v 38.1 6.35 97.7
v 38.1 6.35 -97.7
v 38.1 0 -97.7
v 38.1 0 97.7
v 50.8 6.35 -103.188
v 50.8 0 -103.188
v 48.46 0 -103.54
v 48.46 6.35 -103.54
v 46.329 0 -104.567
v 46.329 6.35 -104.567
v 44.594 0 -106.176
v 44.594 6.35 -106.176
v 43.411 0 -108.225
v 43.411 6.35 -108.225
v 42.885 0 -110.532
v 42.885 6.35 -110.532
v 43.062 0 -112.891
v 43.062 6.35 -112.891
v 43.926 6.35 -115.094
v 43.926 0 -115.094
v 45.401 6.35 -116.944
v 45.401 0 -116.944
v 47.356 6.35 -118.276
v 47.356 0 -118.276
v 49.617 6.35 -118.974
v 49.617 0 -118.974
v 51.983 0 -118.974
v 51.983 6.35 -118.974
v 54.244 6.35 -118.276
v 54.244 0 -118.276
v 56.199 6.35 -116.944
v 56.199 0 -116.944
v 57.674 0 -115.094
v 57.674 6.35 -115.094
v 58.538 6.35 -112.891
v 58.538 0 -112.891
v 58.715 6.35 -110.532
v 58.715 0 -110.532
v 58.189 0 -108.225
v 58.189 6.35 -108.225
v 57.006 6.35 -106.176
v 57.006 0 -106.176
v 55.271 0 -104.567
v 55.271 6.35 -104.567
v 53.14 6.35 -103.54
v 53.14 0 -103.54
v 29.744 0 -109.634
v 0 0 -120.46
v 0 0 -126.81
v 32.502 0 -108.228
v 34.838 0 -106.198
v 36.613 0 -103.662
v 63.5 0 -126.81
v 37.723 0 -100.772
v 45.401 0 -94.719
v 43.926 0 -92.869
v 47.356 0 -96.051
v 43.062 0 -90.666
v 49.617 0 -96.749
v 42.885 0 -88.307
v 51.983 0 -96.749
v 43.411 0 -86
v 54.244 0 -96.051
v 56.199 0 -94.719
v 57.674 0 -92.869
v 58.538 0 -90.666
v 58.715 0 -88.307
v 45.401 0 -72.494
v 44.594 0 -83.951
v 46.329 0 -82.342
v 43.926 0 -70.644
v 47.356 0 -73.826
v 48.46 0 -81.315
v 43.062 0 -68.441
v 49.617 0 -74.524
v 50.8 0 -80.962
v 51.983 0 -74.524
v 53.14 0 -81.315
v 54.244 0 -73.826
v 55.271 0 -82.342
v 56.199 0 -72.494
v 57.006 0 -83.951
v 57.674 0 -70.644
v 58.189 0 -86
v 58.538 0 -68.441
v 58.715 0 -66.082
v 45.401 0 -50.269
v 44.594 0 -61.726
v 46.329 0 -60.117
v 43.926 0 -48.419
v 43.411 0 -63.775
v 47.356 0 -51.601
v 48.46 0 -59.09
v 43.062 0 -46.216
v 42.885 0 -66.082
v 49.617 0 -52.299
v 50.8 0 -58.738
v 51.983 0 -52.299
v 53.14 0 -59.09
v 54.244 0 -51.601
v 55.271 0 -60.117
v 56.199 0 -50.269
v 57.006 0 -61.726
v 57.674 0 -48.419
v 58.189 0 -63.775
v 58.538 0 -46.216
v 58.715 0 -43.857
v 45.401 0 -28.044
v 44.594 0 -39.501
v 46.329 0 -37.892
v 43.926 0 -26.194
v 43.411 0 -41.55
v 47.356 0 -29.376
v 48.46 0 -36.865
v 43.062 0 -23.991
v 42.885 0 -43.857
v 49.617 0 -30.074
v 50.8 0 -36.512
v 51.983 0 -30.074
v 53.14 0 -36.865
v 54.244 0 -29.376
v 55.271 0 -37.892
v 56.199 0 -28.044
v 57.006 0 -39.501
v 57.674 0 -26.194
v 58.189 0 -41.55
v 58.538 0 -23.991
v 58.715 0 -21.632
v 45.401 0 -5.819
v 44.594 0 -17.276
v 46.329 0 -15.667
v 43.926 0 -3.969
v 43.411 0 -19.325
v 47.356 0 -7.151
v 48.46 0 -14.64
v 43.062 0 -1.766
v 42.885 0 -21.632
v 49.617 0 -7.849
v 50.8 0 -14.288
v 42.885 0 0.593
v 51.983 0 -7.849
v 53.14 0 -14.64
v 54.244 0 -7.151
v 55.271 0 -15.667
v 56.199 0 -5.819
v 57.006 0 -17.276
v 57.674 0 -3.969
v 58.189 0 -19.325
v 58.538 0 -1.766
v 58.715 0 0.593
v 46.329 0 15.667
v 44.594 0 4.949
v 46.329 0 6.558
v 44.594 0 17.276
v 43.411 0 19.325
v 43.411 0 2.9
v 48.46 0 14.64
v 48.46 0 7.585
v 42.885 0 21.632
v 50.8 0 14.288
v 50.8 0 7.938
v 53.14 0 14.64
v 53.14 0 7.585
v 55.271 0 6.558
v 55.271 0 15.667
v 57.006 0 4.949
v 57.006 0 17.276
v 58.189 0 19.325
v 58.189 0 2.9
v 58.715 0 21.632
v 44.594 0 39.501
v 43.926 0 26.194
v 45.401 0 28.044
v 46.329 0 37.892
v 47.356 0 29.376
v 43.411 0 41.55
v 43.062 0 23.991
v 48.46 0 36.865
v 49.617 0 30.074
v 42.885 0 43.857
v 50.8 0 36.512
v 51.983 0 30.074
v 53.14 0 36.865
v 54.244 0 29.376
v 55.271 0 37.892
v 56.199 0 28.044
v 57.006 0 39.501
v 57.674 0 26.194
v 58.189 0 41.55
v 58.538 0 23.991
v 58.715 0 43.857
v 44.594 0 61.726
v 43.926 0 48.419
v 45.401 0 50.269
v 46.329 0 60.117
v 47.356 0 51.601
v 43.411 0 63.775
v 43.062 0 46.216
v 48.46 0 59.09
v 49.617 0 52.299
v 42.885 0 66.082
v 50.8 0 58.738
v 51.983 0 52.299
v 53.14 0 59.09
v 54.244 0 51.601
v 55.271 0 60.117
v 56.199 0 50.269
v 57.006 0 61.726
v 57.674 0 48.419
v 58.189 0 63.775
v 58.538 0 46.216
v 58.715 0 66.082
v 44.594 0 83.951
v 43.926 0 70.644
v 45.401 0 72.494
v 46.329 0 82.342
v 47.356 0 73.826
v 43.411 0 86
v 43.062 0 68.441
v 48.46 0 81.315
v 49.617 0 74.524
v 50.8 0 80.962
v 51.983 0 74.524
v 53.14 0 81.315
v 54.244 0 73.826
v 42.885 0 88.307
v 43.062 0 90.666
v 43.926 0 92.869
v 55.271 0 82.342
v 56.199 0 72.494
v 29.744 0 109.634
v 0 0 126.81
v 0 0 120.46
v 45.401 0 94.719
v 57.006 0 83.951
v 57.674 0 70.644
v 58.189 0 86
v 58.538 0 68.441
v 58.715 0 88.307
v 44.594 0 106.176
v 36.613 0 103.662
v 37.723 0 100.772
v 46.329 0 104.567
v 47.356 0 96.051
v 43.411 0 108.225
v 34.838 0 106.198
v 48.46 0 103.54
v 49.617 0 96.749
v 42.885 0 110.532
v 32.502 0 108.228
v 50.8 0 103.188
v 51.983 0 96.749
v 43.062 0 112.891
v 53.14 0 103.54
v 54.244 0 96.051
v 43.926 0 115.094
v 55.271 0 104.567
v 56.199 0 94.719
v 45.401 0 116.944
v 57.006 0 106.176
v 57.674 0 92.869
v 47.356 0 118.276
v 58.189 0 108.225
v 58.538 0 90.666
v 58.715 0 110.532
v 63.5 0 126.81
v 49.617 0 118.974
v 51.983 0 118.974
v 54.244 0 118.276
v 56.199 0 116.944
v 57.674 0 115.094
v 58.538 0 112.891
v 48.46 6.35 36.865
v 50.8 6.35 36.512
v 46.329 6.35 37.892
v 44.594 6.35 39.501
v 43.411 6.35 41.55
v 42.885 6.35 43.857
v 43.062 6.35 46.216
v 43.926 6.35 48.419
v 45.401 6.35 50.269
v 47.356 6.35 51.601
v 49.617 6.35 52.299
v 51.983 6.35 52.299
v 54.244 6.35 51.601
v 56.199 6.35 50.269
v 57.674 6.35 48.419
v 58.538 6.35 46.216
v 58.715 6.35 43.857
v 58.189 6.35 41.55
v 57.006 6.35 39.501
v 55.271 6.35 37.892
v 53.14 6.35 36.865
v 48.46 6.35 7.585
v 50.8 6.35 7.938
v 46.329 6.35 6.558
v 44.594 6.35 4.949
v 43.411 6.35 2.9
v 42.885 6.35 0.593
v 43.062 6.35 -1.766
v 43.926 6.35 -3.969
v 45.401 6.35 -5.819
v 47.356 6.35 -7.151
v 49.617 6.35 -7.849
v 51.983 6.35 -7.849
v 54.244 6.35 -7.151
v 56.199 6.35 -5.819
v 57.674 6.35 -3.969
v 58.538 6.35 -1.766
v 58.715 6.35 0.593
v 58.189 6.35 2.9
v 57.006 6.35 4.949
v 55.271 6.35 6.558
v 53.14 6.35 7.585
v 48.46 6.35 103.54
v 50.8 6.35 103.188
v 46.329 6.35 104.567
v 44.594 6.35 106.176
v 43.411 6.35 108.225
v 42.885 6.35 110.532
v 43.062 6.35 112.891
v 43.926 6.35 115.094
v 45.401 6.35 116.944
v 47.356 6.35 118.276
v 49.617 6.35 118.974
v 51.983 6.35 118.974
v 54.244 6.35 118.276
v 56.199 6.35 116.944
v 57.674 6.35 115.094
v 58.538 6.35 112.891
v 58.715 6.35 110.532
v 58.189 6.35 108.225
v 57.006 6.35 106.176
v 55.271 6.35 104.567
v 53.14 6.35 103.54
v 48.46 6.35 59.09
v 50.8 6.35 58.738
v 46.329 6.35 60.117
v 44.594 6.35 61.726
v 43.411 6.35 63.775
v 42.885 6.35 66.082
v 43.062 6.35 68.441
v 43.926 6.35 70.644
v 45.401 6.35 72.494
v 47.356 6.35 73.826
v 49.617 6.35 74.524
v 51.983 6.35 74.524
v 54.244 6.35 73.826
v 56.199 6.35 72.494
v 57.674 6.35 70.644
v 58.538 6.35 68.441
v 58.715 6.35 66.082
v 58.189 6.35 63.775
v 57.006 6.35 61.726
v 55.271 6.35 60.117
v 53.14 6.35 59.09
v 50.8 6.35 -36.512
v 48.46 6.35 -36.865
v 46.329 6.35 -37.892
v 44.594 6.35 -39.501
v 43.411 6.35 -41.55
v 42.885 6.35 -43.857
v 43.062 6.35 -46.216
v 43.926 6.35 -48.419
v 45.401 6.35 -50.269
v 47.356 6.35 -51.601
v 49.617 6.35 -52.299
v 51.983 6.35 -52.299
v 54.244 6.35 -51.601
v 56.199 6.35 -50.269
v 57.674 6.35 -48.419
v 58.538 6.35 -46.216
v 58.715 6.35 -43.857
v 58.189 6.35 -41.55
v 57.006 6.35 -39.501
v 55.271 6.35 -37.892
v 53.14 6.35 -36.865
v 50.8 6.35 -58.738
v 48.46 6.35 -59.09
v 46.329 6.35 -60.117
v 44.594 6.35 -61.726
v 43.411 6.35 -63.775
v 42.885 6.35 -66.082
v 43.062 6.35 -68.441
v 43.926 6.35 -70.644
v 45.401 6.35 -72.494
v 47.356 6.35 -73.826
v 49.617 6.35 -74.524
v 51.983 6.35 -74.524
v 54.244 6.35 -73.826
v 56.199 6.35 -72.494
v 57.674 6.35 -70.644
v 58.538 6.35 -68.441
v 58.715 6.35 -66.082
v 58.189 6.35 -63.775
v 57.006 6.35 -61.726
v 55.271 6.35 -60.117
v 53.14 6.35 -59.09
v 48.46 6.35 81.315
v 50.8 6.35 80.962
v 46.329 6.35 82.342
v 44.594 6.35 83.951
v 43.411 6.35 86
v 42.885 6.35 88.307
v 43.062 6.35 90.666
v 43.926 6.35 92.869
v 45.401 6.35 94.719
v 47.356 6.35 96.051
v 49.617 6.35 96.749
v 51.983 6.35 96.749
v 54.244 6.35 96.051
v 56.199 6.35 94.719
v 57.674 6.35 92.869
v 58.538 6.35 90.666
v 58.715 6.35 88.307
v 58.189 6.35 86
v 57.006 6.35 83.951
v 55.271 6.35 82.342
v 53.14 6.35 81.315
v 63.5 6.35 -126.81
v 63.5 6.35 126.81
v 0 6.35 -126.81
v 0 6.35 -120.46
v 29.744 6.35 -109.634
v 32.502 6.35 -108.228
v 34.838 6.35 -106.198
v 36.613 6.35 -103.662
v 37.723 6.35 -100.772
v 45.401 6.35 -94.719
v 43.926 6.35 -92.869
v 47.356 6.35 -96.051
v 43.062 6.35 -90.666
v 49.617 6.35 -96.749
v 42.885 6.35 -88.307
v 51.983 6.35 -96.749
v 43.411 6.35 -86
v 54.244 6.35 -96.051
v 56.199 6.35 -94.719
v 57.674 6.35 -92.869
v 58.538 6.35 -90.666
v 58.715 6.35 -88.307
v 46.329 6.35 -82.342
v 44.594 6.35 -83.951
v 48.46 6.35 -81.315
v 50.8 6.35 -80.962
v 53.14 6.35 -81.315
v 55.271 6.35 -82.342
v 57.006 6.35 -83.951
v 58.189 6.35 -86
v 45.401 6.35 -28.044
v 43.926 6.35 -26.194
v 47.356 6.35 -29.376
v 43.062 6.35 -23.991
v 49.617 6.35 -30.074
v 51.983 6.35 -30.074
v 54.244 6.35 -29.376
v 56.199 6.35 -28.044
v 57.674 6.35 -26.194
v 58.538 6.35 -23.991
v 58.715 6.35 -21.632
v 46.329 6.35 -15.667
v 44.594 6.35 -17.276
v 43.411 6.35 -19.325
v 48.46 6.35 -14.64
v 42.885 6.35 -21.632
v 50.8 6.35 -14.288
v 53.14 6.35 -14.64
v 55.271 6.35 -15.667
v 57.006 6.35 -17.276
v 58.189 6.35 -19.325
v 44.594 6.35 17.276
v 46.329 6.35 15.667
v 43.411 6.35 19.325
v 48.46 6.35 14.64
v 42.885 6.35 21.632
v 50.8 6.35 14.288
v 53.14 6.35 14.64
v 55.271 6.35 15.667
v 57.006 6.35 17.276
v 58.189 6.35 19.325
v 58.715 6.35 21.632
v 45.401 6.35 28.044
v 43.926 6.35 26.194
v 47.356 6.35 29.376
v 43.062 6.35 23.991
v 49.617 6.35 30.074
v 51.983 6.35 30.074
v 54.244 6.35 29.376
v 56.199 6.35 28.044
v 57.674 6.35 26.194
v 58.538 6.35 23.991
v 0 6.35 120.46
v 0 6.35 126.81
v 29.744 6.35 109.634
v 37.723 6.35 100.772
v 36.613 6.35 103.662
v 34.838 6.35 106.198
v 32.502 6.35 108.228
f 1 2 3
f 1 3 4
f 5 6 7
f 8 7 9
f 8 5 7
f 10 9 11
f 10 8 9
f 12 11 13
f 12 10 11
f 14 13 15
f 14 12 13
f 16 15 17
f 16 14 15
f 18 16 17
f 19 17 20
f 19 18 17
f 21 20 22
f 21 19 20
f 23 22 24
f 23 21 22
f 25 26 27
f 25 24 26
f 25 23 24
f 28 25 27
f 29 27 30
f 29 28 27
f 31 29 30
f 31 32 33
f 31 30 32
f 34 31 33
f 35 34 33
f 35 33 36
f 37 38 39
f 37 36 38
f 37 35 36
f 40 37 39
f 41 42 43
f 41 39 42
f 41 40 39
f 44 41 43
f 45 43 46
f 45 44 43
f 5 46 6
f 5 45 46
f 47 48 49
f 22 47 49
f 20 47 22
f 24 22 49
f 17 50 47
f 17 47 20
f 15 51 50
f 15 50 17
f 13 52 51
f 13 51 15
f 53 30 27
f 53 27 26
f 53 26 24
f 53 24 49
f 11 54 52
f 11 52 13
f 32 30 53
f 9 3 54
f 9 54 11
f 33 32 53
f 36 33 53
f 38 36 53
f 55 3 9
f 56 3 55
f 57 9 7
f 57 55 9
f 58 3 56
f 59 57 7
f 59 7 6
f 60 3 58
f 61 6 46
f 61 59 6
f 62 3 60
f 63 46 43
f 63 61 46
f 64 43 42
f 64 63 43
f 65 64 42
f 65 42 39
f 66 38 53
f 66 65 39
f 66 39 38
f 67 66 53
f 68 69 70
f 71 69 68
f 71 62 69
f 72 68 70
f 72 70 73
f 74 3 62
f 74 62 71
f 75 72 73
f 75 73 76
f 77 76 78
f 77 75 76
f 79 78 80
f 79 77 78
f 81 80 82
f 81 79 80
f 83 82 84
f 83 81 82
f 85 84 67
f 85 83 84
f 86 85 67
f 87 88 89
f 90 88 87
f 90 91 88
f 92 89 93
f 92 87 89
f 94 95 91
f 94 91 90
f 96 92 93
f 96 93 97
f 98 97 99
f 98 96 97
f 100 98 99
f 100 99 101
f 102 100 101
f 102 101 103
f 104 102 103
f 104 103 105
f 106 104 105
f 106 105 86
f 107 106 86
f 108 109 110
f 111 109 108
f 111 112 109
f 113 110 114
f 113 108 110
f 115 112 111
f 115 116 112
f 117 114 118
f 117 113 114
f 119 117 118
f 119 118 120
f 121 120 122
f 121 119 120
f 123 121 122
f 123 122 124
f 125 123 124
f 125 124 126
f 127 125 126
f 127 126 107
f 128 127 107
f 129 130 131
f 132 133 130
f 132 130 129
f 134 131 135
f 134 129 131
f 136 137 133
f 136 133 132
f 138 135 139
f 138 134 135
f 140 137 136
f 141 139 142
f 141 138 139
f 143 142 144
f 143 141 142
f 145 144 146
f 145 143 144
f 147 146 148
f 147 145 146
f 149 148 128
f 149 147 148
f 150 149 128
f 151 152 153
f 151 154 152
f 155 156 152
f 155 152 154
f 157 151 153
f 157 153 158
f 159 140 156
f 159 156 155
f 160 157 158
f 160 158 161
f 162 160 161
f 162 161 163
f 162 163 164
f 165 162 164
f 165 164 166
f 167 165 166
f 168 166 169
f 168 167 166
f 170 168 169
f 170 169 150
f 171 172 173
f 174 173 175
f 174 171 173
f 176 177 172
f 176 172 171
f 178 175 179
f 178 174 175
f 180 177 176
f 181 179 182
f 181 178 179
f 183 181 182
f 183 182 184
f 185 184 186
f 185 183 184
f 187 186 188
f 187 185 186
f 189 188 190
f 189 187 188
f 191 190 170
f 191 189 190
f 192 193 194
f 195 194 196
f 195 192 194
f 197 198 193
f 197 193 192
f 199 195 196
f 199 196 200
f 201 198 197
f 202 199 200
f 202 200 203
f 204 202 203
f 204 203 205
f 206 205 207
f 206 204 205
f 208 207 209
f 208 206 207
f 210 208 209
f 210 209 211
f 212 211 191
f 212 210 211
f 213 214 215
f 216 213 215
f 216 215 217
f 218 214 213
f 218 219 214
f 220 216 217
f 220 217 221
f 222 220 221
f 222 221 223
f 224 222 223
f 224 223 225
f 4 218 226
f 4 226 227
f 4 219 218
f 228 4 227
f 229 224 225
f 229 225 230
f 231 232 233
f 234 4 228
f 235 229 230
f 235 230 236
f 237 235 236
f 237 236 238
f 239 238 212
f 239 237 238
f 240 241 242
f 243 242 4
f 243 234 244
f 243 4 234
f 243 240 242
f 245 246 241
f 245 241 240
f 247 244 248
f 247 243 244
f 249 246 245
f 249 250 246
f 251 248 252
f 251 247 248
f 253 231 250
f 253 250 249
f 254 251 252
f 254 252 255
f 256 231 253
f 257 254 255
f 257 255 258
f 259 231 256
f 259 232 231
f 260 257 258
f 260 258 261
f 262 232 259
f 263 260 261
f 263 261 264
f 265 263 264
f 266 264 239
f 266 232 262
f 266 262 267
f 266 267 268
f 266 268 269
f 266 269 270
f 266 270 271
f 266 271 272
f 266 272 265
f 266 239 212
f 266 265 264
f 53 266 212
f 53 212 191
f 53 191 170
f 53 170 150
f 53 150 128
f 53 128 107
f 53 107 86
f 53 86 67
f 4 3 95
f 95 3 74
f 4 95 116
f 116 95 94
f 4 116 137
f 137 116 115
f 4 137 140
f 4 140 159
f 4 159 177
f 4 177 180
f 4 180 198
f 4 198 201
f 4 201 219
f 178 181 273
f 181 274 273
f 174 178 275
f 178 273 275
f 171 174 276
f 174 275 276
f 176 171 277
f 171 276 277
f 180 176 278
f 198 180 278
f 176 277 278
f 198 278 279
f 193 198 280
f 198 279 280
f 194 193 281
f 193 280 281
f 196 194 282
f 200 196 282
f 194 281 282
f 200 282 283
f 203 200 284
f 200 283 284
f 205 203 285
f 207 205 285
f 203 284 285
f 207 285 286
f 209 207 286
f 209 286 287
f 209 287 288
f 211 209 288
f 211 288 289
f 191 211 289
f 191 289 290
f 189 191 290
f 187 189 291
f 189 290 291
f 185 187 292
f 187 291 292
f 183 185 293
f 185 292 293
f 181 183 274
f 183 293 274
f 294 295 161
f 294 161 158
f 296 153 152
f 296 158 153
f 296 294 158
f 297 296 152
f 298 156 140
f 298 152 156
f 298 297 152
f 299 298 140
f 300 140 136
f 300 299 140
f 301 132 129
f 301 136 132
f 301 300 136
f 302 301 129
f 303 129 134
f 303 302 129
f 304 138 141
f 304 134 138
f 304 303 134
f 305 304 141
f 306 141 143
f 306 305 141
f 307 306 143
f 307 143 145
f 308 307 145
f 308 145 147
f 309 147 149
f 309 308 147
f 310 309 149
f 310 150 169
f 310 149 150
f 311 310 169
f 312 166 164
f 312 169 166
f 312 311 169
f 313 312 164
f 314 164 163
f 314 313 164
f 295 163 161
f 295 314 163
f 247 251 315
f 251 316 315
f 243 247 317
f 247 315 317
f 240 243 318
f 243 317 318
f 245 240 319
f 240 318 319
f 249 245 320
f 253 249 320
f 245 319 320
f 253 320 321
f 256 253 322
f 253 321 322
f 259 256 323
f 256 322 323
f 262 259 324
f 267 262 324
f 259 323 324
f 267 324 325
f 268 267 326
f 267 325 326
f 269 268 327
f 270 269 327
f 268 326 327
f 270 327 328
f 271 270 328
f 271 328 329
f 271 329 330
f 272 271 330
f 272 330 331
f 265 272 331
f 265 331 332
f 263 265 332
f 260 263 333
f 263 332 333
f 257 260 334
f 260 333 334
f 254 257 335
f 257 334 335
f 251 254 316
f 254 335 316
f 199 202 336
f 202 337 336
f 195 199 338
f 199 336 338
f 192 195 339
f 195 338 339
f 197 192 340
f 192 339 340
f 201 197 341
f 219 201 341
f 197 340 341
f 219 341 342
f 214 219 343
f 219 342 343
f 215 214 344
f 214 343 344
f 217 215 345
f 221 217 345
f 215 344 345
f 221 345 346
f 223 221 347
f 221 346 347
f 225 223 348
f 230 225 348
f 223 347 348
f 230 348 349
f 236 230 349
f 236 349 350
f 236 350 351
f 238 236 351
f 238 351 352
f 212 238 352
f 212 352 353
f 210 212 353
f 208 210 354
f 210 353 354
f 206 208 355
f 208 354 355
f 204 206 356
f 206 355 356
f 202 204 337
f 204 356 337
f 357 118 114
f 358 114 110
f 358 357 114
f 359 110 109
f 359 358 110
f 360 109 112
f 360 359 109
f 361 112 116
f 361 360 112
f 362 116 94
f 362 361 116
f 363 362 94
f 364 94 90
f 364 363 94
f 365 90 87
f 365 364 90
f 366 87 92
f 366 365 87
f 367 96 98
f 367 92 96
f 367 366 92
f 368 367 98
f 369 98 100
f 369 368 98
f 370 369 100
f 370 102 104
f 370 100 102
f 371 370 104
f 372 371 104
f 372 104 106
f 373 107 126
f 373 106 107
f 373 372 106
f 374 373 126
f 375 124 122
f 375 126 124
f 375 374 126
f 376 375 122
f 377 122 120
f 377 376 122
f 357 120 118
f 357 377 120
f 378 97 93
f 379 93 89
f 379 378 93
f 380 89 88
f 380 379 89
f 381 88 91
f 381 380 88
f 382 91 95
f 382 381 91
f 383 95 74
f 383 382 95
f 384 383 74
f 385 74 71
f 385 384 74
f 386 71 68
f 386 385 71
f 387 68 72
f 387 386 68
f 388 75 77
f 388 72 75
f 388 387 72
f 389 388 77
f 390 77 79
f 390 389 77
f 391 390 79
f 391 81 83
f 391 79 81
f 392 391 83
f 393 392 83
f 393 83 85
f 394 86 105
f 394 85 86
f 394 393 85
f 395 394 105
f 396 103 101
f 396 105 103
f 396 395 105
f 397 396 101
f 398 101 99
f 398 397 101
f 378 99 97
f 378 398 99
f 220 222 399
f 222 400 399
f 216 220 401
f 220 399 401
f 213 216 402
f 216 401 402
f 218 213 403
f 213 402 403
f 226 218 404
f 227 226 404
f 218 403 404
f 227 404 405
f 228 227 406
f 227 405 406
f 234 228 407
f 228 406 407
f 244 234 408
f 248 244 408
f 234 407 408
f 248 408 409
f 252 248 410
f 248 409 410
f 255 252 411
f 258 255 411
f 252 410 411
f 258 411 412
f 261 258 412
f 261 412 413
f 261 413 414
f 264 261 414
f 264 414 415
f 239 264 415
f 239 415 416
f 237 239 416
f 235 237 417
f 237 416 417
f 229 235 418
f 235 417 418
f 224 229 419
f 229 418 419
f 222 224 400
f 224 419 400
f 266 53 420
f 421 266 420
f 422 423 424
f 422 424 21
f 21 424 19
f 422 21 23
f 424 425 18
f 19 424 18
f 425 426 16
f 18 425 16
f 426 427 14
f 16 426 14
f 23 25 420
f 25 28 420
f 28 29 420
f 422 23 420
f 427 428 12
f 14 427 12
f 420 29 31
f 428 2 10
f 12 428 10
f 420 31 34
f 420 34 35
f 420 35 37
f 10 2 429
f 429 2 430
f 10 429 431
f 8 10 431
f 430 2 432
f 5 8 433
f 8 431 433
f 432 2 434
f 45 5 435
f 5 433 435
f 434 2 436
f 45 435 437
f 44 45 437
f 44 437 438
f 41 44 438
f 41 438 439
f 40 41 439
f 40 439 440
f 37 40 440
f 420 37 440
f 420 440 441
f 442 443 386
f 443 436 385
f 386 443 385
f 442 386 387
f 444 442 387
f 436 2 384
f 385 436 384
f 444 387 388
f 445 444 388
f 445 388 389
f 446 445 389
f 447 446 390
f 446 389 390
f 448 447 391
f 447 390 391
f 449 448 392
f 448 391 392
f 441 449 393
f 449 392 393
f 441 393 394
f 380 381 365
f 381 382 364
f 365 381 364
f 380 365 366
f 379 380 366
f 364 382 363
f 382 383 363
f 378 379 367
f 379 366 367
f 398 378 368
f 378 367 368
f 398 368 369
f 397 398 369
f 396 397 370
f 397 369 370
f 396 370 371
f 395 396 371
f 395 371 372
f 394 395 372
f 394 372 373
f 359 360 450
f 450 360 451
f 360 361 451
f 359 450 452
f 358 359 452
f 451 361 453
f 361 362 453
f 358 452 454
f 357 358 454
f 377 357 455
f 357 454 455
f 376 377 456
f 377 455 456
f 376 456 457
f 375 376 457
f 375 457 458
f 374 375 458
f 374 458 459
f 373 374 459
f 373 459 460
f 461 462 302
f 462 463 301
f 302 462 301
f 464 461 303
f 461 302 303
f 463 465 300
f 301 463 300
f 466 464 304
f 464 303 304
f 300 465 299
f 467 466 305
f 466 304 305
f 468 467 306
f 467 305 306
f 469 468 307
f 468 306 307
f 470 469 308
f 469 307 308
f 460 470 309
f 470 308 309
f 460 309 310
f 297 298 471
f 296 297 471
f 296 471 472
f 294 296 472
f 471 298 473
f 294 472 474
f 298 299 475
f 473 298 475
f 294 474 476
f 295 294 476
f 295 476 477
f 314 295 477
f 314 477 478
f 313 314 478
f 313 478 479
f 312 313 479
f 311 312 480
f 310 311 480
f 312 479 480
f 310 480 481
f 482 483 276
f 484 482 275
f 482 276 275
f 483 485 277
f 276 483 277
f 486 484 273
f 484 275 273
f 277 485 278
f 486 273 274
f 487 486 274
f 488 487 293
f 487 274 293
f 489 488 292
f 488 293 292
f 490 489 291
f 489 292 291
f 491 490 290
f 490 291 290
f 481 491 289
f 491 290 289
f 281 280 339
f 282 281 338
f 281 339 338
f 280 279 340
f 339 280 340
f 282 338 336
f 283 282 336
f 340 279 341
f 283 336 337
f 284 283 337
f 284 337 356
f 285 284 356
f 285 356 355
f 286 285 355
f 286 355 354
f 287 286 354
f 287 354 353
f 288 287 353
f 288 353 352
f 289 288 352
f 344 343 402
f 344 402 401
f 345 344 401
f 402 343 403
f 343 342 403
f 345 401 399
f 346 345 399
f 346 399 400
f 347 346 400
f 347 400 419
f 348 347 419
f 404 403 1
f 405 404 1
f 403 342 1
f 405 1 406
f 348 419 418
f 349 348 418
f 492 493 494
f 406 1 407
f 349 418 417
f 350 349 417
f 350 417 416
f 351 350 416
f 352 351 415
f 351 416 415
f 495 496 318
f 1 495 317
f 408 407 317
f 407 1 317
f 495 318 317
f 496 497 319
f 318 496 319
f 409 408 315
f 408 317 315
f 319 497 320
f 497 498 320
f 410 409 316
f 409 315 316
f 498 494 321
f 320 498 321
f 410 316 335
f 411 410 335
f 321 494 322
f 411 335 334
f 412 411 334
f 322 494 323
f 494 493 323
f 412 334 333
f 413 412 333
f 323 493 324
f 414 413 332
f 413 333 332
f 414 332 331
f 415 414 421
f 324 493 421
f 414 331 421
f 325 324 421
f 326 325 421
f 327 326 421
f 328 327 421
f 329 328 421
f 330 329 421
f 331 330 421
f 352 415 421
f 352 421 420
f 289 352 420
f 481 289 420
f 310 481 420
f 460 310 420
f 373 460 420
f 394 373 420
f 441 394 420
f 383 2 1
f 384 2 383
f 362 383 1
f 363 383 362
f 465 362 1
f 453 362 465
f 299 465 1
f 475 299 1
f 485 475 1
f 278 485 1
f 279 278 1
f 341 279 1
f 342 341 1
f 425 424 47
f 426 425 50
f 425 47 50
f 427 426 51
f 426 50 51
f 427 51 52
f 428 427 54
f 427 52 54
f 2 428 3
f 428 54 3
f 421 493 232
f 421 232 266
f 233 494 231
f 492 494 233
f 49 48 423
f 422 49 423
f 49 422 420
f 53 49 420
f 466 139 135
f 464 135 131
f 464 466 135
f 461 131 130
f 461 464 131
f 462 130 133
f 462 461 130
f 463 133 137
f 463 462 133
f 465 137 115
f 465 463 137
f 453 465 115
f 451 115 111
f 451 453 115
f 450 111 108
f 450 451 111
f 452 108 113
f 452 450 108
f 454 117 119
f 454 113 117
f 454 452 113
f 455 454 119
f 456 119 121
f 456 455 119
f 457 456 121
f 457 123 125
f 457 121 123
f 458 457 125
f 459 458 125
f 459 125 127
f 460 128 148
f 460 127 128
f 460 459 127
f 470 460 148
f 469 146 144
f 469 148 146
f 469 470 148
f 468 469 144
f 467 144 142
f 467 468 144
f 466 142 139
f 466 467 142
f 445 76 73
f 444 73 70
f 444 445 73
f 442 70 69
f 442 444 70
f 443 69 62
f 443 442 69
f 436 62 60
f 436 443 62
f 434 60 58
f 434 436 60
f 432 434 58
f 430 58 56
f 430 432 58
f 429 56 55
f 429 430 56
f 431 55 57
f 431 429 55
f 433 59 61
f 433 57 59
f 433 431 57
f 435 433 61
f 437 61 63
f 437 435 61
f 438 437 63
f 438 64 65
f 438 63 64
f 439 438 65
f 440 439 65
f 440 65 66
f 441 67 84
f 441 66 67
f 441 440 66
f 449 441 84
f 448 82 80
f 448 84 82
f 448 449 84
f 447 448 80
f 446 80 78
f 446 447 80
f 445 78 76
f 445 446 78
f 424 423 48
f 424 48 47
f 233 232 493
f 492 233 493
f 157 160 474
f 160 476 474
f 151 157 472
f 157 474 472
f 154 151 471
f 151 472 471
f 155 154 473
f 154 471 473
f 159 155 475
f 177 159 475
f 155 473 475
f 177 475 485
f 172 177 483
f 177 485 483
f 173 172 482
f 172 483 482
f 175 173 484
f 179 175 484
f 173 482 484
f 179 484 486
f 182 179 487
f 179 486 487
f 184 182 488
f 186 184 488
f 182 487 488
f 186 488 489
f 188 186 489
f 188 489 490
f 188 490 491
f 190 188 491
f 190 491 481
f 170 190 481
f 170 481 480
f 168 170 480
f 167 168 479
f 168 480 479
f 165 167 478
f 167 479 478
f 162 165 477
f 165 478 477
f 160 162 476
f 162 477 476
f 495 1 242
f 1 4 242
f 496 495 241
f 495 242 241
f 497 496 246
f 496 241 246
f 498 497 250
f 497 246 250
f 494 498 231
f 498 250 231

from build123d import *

# Parameters (mm, degrees)
SKETCH1_W               = 63.5
SKETCH1_H               = 6.35
BOSS_EXTRUDE1_DEPTH     = 126.8095
CUT_EXTRUDE1_DEPTH      = 1
CUT_EXTRUDE1_DEPTH_BACK = 7.35
FILLET1_R               = 12.7
LPATTERN1_COUNT         = 6
LPATTERN1_PITCH         = 22.225


with BuildPart() as part:
    # Sketch1 → Boss-Extrude1 (new body, symmetric)
    with BuildSketch(Plane.XY):
        with Locations((31.75, 3.175)):
            Rectangle(SKETCH1_W, SKETCH1_H)
    extrude(amount=BOSS_EXTRUDE1_DEPTH, both=True)

    # Sketch2 → Cut-Extrude1 (cut, two sides)
    with BuildSketch(Plane(origin=(0, 6.35, 0), x_dir=(1, 0, 0), z_dir=(0, 1, 0))) as cut_extrude1_sk:
        Polygon((-489.189690869, 298.509986386), (0, 120.4595), (38.1, 106.592234074), (38.1, -106.592234074), (0, -120.4595), (-489.189690869, -298.509986386), (-1530.359281964, -298.509986386), (-1530.359281964, 298.509986386), align=None)
    extrude(amount=CUT_EXTRUDE1_DEPTH, mode=Mode.SUBTRACT)
    extrude(cut_extrude1_sk.sketch, amount=-CUT_EXTRUDE1_DEPTH_BACK, mode=Mode.SUBTRACT)

    # Fillet1
    fillet1_edges = [part.edges().sort_by_distance(p)[0] for p in [
        (38.1, 3.175, -106.592234074),
        (38.1, 3.175, 106.592234074),
    ]]
    fillet(fillet1_edges, radius=FILLET1_R)

    # Sketch4 → 5/8 (0.625) Diameter Hole1 (revolve, cut)
    with BuildSketch(Plane(origin=(50.8, 6.35, 0), x_dir=(0, 0, 1), z_dir=(1, 0, 0))):
        Polygon((0, 0), (0, 23.819331164), (7.9375, 19.05), (7.9375, 0), align=None)
    f_5_8_0_625_diameter_hole1 = revolve(axis=Axis((50.8, 12.7, 0), (0, -1, 0)), mode=Mode.SUBTRACT)

    # LPattern1: 5/8 (0.625) Diameter Hole1 ×6
    with Locations(*[(0, 0, -i * LPATTERN1_PITCH) for i in range(1, LPATTERN1_COUNT)]):
        add(f_5_8_0_625_diameter_hole1, mode=Mode.SUBTRACT)

    # Mirror1 copy 1 sketch → Mirror1 copy 1 (revolve, cut)
    with BuildSketch(Plane(origin=(50.8, 6.35, 22.225), x_dir=(0, 0, -1), z_dir=(1, 0, 0))):
        Polygon((0, 0), (0, -23.819331164), (7.9375, -19.05), (7.9375, 0), align=None)
    revolve(axis=Axis((50.8, 12.7, 22.225), (0, 1, 0)), mode=Mode.SUBTRACT)

    # Mirror1 copy 2 sketch → Mirror1 copy 2 (revolve, cut)
    with BuildSketch(Plane(origin=(50.8, 6.35, 44.45), x_dir=(0, 0, -1), z_dir=(1, 0, 0))):
        Polygon((0, 0), (0, -23.819331164), (7.9375, -19.05), (7.9375, 0), align=None)
    revolve(axis=Axis((50.8, 12.7, 44.45), (0, 1, 0)), mode=Mode.SUBTRACT)

    # Mirror1 copy 3 sketch → Mirror1 copy 3 (revolve, cut)
    with BuildSketch(Plane(origin=(50.8, 6.35, 66.675), x_dir=(0, 0, -1), z_dir=(1, 0, 0))):
        Polygon((0, 0), (0, -23.819331164), (7.9375, -19.05), (7.9375, 0), align=None)
    revolve(axis=Axis((50.8, 12.7, 66.675), (0, 1, 0)), mode=Mode.SUBTRACT)

    # Mirror1 copy 4 sketch → Mirror1 copy 4 (revolve, cut)
    with BuildSketch(Plane(origin=(50.8, 6.35, 88.9), x_dir=(0, 0, -1), z_dir=(1, 0, 0))):
        Polygon((0, 0), (0, -23.819331164), (7.9375, -19.05), (7.9375, 0), align=None)
    revolve(axis=Axis((50.8, 12.7, 88.9), (0, 1, 0)), mode=Mode.SUBTRACT)

    # Mirror1 copy 5 sketch → Mirror1 copy 5 (revolve, cut)
    with BuildSketch(Plane(origin=(50.8, 6.35, 111.125), x_dir=(0, 0, -1), z_dir=(1, 0, 0))):
        Polygon((0, 0), (0, -23.819331164), (7.9375, -19.05), (7.9375, 0), align=None)
    revolve(axis=Axis((50.8, 12.7, 111.125), (0, 1, 0)), mode=Mode.SUBTRACT)

    # Mirror1 copy 6 sketch → Mirror1 copy 6 (revolve, cut)
    with BuildSketch(Plane(origin=(50.8, 6.35, 0), x_dir=(0, 0, -1), z_dir=(1, 0, 0))):
        Polygon((0, 0), (0, -23.819331164), (7.9375, -19.05), (7.9375, 0), align=None)
    revolve(axis=Axis((50.8, 12.7, 0), (0, 1, 0)), mode=Mode.SUBTRACT)


solid = part.part
